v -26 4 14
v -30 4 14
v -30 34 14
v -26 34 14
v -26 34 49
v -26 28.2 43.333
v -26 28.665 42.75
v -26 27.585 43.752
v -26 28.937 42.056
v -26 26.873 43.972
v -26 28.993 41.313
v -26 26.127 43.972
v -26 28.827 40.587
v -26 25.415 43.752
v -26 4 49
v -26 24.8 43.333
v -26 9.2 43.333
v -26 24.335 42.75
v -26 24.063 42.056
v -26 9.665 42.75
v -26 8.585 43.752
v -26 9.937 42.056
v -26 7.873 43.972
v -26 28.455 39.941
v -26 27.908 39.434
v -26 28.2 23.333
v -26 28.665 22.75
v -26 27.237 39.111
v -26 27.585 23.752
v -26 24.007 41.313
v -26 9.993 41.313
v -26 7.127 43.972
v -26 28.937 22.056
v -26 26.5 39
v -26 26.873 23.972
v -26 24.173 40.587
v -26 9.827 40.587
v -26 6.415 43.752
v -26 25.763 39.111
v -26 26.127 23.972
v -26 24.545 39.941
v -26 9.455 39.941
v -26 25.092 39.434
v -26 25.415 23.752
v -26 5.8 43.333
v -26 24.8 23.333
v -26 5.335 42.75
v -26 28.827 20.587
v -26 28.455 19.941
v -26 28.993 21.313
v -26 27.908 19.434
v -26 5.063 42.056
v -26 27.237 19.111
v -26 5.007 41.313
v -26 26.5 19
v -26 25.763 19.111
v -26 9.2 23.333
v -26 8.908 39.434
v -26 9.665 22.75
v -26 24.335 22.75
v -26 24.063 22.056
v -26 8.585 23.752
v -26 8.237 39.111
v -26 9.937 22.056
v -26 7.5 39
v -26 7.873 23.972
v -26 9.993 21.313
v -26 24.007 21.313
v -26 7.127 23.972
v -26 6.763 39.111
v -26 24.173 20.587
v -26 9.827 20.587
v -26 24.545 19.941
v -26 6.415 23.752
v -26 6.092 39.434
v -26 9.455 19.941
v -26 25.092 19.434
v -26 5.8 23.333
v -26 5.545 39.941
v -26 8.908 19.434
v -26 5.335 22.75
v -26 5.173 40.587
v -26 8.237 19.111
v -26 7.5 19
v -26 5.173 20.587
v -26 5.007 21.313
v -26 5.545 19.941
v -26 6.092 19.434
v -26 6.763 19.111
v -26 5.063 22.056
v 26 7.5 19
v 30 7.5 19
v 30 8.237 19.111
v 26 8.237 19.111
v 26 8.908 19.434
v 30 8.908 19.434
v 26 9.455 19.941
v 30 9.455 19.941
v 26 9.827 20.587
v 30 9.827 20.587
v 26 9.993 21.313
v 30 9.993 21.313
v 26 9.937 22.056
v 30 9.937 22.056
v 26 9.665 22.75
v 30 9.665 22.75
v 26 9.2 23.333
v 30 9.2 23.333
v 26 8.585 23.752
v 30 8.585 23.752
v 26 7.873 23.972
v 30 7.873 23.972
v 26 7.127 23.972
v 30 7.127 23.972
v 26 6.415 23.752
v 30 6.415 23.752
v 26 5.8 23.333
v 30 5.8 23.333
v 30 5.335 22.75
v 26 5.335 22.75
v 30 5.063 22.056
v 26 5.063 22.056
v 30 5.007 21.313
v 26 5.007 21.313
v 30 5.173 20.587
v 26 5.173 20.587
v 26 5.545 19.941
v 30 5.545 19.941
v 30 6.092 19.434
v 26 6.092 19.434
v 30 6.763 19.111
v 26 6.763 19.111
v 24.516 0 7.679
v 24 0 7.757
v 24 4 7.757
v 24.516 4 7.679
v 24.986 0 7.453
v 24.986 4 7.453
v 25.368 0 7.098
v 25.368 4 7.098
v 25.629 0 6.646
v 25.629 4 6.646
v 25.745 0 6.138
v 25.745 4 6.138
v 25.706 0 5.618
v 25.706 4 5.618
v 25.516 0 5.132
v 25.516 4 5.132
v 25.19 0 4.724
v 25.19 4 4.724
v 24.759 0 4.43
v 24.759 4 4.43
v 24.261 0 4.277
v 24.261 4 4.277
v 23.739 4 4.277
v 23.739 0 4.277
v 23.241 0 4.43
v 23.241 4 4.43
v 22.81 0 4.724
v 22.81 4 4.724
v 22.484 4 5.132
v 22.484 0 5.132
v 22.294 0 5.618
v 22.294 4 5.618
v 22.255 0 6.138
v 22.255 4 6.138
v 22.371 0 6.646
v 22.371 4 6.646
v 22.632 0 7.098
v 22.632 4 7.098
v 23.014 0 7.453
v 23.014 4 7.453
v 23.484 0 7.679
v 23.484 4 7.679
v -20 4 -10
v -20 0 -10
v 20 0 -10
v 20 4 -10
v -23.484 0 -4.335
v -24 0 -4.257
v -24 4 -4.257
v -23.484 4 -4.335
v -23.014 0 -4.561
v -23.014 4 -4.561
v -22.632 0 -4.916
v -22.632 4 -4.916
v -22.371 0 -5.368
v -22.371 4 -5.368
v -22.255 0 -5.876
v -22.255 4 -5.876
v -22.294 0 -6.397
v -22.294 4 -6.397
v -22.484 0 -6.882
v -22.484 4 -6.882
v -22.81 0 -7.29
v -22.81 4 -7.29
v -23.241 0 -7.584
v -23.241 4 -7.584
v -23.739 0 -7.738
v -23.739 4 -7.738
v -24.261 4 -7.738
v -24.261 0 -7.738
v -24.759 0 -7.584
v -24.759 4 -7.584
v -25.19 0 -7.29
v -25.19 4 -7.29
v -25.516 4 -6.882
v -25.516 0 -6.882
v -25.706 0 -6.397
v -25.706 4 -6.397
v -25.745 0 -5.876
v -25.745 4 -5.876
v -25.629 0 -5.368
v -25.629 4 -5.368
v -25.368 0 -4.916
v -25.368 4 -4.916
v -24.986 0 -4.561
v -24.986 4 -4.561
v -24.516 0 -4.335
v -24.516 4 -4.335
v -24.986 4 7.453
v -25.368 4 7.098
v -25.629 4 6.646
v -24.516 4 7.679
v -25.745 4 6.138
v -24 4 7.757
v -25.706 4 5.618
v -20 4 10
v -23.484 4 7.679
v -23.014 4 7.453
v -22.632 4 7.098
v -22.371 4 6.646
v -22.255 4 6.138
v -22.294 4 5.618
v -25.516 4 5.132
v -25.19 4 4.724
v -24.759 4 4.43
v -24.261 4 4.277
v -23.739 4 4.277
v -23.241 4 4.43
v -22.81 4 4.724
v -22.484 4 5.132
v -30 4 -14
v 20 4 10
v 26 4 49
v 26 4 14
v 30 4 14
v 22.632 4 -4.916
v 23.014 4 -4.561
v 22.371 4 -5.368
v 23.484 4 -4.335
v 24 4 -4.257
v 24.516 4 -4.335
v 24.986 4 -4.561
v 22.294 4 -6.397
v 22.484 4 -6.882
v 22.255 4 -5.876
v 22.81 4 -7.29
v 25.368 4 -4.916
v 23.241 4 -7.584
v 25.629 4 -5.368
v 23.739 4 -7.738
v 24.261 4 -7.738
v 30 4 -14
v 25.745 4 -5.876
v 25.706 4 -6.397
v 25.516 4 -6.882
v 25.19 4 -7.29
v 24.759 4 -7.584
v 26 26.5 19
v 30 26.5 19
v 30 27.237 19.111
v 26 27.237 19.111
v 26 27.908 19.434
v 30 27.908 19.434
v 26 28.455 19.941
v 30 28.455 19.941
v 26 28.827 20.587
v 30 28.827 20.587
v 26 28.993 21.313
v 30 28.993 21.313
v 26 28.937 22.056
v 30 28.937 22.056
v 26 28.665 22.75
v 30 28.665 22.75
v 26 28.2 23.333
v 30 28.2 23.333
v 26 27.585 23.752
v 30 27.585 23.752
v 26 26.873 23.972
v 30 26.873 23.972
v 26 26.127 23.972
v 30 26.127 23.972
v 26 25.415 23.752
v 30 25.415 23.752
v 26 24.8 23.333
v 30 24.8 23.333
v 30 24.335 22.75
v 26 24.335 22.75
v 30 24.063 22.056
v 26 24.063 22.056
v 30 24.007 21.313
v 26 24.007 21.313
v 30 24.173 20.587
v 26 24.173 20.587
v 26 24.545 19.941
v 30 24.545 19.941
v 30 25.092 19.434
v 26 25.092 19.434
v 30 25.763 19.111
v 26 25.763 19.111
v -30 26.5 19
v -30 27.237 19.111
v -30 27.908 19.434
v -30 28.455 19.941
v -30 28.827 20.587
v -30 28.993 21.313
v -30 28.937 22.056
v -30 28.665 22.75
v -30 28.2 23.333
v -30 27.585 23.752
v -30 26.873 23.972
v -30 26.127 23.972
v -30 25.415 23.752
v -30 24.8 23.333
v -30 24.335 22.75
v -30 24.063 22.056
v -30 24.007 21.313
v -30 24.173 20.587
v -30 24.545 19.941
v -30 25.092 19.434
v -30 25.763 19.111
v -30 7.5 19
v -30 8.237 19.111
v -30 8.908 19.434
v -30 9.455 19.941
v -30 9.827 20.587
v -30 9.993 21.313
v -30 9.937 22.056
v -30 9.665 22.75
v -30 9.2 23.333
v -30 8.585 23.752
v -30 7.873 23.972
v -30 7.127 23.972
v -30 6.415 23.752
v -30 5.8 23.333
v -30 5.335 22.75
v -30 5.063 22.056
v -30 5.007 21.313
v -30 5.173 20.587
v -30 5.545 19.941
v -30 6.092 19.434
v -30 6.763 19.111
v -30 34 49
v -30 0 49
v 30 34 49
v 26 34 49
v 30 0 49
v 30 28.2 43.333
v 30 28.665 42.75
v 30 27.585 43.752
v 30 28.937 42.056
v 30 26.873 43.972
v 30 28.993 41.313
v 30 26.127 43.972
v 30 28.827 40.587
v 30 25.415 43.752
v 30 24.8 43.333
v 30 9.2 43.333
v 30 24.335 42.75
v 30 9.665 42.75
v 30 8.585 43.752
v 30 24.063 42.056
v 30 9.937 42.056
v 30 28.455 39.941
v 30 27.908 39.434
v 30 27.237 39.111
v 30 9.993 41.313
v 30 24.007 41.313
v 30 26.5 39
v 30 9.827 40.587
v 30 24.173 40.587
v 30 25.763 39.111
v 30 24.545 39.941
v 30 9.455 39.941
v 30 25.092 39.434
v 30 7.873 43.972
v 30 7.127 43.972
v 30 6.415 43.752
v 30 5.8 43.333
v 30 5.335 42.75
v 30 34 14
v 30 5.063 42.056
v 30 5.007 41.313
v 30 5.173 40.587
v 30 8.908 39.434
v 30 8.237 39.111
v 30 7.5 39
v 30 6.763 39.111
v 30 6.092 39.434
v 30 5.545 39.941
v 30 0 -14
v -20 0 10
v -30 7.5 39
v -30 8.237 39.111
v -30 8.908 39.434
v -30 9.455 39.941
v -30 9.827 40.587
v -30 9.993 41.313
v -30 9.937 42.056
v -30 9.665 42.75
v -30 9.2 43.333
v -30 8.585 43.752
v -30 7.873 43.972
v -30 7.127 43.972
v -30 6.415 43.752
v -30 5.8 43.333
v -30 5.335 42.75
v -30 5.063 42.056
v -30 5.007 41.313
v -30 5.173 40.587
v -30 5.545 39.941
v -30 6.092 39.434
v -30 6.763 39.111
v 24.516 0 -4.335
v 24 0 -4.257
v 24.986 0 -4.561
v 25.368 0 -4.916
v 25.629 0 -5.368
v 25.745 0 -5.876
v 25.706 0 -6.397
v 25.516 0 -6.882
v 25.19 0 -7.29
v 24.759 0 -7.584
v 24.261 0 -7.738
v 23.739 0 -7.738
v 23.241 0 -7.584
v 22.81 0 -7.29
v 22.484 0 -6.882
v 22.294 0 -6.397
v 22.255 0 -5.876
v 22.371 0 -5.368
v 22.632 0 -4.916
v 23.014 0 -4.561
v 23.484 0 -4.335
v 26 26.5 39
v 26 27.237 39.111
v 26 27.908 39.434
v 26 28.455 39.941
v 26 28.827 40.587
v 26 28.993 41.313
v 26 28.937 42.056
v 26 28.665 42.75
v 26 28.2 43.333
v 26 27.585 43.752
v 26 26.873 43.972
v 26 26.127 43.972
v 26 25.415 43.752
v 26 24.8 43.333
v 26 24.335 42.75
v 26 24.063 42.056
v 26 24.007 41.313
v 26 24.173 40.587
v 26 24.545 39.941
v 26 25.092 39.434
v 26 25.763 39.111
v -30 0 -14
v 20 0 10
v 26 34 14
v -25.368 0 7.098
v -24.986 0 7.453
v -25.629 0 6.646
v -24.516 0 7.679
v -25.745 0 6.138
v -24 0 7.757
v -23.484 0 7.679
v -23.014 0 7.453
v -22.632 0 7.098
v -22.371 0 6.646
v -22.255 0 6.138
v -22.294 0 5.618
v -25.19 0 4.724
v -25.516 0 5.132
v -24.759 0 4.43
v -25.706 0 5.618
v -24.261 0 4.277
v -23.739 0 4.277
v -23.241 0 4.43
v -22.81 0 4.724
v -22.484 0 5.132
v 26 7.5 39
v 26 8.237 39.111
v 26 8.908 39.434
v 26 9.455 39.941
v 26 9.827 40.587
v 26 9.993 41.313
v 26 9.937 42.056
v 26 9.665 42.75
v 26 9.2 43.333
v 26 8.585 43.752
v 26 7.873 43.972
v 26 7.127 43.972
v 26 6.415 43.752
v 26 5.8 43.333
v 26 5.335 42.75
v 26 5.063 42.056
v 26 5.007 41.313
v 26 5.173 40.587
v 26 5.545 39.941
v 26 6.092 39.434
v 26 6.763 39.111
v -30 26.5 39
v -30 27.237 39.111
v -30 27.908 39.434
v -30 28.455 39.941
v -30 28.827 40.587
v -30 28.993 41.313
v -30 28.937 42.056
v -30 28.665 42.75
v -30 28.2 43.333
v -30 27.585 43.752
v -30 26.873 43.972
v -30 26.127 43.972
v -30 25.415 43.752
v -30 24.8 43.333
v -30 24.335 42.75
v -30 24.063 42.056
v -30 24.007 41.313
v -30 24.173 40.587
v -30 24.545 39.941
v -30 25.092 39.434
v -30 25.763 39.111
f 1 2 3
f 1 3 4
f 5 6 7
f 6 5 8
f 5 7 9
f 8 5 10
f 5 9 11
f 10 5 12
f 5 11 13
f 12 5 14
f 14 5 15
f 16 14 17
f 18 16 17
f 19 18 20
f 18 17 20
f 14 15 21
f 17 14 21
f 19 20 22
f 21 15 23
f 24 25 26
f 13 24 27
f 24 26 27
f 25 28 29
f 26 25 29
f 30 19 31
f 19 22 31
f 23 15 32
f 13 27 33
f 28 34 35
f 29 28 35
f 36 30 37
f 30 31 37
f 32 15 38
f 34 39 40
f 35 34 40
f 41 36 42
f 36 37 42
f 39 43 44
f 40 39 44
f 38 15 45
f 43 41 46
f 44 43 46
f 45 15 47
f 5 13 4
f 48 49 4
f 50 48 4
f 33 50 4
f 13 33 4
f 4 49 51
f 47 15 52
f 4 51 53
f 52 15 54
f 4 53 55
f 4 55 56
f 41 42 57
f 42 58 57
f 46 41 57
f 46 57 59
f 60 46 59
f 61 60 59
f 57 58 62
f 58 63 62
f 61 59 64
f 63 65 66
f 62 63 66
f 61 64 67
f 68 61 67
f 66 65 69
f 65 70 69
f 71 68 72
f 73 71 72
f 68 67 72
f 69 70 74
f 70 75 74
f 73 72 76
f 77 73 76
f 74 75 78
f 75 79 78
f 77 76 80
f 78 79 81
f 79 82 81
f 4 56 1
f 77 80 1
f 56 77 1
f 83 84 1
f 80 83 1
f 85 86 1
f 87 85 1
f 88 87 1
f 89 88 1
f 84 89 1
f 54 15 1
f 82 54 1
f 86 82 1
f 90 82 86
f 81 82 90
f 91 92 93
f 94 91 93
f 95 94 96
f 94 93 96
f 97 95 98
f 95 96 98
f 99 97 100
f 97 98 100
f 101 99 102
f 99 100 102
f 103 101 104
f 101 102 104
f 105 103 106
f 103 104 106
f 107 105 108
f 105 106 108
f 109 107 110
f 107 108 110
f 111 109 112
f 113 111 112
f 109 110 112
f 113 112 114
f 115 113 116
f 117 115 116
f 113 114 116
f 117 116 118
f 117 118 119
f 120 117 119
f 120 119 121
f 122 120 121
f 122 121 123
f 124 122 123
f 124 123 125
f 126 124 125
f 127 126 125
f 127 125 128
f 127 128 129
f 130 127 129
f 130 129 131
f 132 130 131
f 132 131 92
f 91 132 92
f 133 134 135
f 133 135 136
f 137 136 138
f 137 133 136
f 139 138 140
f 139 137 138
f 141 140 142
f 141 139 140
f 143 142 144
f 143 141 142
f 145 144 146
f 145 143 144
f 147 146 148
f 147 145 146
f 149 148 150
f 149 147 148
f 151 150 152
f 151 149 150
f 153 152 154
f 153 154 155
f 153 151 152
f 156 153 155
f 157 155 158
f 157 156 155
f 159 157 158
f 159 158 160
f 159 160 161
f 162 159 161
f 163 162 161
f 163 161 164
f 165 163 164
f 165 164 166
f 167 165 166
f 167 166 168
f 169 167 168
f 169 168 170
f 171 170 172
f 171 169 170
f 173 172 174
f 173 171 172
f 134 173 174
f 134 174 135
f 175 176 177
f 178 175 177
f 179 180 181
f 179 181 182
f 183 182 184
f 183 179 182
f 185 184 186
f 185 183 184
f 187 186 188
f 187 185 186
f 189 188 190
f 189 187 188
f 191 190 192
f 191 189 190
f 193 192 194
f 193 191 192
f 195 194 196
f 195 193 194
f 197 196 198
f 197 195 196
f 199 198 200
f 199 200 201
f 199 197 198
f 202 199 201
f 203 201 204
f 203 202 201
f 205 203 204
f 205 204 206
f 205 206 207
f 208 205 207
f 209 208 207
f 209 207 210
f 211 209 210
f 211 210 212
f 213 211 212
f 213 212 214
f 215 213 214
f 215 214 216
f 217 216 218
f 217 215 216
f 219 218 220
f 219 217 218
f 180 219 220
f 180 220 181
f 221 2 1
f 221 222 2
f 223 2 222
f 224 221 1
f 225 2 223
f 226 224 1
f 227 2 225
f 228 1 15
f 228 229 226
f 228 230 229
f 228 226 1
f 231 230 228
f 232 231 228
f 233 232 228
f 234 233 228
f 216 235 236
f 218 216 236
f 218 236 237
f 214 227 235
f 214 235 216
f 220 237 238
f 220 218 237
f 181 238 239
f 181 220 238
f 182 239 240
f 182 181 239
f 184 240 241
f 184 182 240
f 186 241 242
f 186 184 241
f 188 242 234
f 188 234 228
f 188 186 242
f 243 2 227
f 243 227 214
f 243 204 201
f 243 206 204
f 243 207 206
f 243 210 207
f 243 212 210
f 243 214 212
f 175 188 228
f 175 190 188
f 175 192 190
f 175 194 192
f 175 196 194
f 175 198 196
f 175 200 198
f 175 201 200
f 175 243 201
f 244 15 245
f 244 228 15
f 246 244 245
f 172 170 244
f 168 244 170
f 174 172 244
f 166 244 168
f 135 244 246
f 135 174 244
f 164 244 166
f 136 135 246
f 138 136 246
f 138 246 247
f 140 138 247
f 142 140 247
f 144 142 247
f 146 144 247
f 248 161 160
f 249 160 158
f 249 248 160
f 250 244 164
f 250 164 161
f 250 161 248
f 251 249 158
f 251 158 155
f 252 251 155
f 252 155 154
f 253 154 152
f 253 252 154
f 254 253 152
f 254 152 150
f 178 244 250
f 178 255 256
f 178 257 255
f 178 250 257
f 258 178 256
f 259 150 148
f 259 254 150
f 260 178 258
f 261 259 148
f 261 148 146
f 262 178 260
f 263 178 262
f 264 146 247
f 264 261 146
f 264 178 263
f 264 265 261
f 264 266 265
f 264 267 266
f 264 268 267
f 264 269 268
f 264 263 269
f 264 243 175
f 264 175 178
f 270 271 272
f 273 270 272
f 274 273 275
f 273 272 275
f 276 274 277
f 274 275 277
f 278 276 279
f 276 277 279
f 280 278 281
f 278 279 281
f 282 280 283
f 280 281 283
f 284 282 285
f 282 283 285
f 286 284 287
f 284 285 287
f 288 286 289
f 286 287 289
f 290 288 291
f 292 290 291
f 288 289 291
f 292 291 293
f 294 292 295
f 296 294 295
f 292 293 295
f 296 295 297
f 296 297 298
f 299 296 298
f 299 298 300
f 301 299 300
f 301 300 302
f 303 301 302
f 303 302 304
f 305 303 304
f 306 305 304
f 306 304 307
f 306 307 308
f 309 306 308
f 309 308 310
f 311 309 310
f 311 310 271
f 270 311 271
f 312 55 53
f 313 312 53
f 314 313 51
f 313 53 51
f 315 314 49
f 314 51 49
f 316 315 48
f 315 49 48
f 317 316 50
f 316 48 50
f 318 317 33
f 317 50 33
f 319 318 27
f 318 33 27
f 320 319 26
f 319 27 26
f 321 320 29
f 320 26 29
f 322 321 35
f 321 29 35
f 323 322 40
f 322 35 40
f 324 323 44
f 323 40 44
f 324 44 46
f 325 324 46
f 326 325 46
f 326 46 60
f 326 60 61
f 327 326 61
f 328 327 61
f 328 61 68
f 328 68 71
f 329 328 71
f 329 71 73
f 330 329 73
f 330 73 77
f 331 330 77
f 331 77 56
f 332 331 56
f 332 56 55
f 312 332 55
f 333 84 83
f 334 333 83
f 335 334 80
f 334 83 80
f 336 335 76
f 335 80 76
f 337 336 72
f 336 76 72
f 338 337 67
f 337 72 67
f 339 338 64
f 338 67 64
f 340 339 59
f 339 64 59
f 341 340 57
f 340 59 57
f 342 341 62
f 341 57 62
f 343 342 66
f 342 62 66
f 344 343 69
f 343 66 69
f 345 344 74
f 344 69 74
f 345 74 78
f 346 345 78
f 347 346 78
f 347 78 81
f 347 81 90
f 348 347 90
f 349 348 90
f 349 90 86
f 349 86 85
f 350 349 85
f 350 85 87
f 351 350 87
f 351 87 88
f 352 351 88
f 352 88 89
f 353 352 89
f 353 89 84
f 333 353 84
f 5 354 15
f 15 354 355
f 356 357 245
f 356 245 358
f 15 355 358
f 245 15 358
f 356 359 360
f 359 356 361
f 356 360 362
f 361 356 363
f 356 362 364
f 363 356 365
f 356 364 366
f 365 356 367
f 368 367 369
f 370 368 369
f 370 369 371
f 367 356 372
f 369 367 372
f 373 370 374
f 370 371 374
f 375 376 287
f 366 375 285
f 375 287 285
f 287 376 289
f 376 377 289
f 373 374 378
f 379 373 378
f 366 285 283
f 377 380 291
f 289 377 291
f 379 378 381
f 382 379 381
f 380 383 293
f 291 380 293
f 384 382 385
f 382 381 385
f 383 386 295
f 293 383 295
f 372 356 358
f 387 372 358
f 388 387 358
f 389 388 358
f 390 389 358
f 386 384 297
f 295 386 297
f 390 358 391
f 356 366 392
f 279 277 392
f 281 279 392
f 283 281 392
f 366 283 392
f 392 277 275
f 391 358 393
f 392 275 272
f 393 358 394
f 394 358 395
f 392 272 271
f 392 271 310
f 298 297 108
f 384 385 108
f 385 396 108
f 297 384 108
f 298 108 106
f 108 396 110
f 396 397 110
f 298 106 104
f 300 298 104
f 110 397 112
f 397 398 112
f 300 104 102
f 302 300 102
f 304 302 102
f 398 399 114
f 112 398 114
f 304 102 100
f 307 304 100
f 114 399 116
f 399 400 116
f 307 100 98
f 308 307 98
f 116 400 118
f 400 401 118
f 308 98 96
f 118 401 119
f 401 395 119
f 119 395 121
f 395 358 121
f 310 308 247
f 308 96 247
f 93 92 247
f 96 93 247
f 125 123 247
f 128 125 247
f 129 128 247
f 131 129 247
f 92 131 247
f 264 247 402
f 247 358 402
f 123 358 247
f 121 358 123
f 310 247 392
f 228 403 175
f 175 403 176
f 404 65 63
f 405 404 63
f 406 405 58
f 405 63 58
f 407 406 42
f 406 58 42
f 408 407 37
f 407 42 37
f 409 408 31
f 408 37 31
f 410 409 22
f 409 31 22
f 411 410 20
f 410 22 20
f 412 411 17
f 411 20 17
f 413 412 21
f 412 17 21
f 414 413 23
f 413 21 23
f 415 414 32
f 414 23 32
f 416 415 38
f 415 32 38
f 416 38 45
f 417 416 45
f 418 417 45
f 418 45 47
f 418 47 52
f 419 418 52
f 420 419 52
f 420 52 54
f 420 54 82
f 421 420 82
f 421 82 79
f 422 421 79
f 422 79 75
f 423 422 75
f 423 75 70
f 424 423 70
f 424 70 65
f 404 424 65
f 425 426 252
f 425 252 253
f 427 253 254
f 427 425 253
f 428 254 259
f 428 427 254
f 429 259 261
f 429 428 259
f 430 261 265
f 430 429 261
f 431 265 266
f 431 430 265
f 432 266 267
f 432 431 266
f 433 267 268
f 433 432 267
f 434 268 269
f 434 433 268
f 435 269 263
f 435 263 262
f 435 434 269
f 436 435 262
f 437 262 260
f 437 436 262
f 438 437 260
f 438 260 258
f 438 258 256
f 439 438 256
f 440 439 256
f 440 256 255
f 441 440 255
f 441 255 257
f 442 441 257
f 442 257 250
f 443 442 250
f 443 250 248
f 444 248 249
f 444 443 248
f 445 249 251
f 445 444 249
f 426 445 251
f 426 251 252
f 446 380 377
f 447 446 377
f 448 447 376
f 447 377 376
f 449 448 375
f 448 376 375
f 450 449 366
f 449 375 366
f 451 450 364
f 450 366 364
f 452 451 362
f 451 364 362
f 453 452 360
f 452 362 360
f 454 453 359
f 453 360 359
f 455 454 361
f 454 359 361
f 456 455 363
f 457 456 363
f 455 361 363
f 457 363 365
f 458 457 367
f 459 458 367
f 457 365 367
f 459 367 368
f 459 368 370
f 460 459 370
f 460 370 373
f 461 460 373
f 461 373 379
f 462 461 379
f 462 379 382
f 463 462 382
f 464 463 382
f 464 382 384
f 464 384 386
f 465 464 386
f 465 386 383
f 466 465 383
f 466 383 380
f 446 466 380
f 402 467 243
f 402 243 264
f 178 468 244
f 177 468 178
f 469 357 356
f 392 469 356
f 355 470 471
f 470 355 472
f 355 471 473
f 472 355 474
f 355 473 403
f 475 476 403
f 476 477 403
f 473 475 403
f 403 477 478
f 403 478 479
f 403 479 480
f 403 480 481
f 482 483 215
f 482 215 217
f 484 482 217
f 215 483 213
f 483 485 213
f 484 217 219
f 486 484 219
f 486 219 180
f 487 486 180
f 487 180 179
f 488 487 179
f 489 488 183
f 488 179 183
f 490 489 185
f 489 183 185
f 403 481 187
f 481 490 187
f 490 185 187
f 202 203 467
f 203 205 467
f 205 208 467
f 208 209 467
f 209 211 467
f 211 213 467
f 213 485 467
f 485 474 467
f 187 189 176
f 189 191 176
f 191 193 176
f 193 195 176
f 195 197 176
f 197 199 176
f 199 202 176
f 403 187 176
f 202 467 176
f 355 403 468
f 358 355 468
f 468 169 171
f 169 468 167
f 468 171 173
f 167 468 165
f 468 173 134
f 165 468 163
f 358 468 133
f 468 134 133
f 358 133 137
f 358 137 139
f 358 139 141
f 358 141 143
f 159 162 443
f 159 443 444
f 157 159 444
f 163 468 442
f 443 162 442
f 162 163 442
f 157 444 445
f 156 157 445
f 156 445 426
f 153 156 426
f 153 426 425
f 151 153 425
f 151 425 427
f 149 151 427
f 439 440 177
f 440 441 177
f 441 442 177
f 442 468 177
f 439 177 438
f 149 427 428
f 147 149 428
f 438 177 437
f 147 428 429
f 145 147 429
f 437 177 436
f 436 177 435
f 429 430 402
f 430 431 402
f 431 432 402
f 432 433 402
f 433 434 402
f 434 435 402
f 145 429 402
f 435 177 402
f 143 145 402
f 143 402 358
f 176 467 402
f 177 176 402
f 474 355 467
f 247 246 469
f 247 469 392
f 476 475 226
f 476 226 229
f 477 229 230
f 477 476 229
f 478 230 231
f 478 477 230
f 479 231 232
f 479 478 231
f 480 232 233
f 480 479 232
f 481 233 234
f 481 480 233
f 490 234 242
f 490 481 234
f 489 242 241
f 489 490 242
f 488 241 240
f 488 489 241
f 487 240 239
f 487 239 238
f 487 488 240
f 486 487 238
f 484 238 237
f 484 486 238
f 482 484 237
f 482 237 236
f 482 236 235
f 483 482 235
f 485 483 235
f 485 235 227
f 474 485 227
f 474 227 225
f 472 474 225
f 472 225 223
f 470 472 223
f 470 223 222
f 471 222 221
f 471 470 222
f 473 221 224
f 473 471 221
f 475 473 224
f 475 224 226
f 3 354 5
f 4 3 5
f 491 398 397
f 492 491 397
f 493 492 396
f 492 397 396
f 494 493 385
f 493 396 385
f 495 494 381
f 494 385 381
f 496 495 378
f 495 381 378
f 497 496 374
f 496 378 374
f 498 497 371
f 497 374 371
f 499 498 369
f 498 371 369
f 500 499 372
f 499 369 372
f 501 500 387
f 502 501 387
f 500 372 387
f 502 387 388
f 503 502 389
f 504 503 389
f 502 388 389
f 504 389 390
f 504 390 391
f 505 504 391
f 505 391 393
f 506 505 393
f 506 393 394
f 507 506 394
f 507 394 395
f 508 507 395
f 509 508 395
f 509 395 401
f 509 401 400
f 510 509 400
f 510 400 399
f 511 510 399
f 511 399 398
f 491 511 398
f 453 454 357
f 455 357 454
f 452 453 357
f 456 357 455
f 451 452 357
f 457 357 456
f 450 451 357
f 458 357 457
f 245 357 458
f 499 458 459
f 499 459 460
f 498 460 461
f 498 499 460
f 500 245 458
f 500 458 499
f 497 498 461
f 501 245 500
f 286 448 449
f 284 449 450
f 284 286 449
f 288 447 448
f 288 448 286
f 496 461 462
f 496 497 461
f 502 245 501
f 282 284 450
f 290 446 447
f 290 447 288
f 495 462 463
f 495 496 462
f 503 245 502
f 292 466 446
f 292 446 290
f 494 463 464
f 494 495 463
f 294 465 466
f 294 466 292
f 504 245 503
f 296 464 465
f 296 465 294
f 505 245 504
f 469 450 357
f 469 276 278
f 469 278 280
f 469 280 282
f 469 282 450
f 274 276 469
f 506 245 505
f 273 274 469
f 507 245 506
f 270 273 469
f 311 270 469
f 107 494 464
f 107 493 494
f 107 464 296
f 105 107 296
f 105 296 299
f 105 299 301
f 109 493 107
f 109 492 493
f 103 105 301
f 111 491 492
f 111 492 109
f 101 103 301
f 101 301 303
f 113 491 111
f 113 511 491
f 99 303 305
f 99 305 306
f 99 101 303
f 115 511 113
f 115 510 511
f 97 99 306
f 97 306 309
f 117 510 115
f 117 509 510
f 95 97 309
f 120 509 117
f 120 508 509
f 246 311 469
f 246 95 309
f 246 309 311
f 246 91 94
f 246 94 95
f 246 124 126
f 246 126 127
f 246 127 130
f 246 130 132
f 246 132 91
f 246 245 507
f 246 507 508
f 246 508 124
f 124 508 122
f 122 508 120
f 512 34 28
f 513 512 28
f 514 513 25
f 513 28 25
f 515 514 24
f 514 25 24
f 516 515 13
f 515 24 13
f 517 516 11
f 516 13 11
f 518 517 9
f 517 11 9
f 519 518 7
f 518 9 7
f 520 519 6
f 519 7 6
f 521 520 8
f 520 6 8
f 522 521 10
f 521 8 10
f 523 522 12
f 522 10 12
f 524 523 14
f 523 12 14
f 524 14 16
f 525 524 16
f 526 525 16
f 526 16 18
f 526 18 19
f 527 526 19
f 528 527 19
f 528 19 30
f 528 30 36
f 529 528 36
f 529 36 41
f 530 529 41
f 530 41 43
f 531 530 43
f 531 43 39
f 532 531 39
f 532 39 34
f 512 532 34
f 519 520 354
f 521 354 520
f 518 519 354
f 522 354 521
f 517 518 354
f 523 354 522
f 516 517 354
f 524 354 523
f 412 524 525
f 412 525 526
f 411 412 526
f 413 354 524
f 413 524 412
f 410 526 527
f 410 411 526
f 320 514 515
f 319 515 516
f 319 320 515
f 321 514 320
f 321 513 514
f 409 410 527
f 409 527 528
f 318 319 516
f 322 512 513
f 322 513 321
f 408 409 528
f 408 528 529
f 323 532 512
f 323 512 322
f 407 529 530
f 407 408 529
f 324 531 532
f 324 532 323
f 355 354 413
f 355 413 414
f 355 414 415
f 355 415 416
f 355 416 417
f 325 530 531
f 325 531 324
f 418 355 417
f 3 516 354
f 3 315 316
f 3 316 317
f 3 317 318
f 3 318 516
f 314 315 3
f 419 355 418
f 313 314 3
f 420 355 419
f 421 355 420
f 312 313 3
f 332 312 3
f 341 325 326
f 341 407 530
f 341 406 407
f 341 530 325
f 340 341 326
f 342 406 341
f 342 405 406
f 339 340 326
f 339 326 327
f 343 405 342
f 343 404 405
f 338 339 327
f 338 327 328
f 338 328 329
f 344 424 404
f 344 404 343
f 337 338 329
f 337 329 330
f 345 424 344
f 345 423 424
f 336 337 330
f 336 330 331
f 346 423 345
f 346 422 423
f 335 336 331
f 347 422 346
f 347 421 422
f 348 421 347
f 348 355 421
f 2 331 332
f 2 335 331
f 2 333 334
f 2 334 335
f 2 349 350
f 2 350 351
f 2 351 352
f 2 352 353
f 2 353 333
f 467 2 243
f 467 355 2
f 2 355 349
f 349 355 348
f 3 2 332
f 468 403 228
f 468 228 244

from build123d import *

# Parameters (mm, degrees)
SKETCH_1_R          = 1.75
SKETCH_1_W          = 40
SKETCH_1_H          = 20
EXTRUDE_1_DEPTH     = 4
SKETCH_1_3_W        = 4
SKETCH_1_3_H        = 35
EXTRUDE_2_DEPTH     = 34
SKETCH_2_R          = 2.5
CUT_EXTRUDE_1_DEPTH = 85.599054368


with BuildPart() as part:
    # 草图1 → 凸台-拉伸1 (new body)
    with BuildSketch(Plane(origin=(0, 0, 0), x_dir=(1, 0, 0), z_dir=(0, 1, 0))):
        Polygon((30, 14), (-30, 14), (-30, -14), (-26, -14), (-26, -49), (26, -49), (26, -14), (30, -14), align=None)
        with Locations((-24, -6.007090491)):
            Circle(SKETCH_1_R, mode=Mode.SUBTRACT)
        with Locations((-24, 6.007090491)):
            Circle(SKETCH_1_R, mode=Mode.SUBTRACT)
        Rectangle(SKETCH_1_W, SKETCH_1_H, mode=Mode.SUBTRACT)
        with Locations((24, -6.007090491)):
            Circle(SKETCH_1_R, mode=Mode.SUBTRACT)
        with Locations((24, 6.007090491)):
            Circle(SKETCH_1_R, mode=Mode.SUBTRACT)
    extrude(amount=EXTRUDE_1_DEPTH)

    # 草图1<3> → 凸台-拉伸2 (add)
    with BuildSketch(Plane(origin=(0, 0, 0), x_dir=(1, 0, 0), z_dir=(0, 1, 0))):
        with Locations((-28, -31.5)):
            Rectangle(SKETCH_1_3_W, SKETCH_1_3_H)
        with Locations((28, -31.5)):
            Rectangle(SKETCH_1_3_W, SKETCH_1_3_H)
    extrude(amount=EXTRUDE_2_DEPTH)

    # 草图2 → 切除-拉伸1 (cut, through all)
    with BuildSketch(Plane(origin=(30, 0, 0), x_dir=(0, 0, -1), z_dir=(1, 0, 0))):
        with Locations((-41.5, 26.5)):
            Circle(SKETCH_2_R)
        with Locations((-21.5, 26.5)):
            Circle(SKETCH_2_R)
        with Locations((-21.5, 7.5)):
            Circle(SKETCH_2_R)
        with Locations((-41.5, 7.5)):
            Circle(SKETCH_2_R)
    extrude(amount=-CUT_EXTRUDE_1_DEPTH, mode=Mode.SUBTRACT)


solid = part.part
